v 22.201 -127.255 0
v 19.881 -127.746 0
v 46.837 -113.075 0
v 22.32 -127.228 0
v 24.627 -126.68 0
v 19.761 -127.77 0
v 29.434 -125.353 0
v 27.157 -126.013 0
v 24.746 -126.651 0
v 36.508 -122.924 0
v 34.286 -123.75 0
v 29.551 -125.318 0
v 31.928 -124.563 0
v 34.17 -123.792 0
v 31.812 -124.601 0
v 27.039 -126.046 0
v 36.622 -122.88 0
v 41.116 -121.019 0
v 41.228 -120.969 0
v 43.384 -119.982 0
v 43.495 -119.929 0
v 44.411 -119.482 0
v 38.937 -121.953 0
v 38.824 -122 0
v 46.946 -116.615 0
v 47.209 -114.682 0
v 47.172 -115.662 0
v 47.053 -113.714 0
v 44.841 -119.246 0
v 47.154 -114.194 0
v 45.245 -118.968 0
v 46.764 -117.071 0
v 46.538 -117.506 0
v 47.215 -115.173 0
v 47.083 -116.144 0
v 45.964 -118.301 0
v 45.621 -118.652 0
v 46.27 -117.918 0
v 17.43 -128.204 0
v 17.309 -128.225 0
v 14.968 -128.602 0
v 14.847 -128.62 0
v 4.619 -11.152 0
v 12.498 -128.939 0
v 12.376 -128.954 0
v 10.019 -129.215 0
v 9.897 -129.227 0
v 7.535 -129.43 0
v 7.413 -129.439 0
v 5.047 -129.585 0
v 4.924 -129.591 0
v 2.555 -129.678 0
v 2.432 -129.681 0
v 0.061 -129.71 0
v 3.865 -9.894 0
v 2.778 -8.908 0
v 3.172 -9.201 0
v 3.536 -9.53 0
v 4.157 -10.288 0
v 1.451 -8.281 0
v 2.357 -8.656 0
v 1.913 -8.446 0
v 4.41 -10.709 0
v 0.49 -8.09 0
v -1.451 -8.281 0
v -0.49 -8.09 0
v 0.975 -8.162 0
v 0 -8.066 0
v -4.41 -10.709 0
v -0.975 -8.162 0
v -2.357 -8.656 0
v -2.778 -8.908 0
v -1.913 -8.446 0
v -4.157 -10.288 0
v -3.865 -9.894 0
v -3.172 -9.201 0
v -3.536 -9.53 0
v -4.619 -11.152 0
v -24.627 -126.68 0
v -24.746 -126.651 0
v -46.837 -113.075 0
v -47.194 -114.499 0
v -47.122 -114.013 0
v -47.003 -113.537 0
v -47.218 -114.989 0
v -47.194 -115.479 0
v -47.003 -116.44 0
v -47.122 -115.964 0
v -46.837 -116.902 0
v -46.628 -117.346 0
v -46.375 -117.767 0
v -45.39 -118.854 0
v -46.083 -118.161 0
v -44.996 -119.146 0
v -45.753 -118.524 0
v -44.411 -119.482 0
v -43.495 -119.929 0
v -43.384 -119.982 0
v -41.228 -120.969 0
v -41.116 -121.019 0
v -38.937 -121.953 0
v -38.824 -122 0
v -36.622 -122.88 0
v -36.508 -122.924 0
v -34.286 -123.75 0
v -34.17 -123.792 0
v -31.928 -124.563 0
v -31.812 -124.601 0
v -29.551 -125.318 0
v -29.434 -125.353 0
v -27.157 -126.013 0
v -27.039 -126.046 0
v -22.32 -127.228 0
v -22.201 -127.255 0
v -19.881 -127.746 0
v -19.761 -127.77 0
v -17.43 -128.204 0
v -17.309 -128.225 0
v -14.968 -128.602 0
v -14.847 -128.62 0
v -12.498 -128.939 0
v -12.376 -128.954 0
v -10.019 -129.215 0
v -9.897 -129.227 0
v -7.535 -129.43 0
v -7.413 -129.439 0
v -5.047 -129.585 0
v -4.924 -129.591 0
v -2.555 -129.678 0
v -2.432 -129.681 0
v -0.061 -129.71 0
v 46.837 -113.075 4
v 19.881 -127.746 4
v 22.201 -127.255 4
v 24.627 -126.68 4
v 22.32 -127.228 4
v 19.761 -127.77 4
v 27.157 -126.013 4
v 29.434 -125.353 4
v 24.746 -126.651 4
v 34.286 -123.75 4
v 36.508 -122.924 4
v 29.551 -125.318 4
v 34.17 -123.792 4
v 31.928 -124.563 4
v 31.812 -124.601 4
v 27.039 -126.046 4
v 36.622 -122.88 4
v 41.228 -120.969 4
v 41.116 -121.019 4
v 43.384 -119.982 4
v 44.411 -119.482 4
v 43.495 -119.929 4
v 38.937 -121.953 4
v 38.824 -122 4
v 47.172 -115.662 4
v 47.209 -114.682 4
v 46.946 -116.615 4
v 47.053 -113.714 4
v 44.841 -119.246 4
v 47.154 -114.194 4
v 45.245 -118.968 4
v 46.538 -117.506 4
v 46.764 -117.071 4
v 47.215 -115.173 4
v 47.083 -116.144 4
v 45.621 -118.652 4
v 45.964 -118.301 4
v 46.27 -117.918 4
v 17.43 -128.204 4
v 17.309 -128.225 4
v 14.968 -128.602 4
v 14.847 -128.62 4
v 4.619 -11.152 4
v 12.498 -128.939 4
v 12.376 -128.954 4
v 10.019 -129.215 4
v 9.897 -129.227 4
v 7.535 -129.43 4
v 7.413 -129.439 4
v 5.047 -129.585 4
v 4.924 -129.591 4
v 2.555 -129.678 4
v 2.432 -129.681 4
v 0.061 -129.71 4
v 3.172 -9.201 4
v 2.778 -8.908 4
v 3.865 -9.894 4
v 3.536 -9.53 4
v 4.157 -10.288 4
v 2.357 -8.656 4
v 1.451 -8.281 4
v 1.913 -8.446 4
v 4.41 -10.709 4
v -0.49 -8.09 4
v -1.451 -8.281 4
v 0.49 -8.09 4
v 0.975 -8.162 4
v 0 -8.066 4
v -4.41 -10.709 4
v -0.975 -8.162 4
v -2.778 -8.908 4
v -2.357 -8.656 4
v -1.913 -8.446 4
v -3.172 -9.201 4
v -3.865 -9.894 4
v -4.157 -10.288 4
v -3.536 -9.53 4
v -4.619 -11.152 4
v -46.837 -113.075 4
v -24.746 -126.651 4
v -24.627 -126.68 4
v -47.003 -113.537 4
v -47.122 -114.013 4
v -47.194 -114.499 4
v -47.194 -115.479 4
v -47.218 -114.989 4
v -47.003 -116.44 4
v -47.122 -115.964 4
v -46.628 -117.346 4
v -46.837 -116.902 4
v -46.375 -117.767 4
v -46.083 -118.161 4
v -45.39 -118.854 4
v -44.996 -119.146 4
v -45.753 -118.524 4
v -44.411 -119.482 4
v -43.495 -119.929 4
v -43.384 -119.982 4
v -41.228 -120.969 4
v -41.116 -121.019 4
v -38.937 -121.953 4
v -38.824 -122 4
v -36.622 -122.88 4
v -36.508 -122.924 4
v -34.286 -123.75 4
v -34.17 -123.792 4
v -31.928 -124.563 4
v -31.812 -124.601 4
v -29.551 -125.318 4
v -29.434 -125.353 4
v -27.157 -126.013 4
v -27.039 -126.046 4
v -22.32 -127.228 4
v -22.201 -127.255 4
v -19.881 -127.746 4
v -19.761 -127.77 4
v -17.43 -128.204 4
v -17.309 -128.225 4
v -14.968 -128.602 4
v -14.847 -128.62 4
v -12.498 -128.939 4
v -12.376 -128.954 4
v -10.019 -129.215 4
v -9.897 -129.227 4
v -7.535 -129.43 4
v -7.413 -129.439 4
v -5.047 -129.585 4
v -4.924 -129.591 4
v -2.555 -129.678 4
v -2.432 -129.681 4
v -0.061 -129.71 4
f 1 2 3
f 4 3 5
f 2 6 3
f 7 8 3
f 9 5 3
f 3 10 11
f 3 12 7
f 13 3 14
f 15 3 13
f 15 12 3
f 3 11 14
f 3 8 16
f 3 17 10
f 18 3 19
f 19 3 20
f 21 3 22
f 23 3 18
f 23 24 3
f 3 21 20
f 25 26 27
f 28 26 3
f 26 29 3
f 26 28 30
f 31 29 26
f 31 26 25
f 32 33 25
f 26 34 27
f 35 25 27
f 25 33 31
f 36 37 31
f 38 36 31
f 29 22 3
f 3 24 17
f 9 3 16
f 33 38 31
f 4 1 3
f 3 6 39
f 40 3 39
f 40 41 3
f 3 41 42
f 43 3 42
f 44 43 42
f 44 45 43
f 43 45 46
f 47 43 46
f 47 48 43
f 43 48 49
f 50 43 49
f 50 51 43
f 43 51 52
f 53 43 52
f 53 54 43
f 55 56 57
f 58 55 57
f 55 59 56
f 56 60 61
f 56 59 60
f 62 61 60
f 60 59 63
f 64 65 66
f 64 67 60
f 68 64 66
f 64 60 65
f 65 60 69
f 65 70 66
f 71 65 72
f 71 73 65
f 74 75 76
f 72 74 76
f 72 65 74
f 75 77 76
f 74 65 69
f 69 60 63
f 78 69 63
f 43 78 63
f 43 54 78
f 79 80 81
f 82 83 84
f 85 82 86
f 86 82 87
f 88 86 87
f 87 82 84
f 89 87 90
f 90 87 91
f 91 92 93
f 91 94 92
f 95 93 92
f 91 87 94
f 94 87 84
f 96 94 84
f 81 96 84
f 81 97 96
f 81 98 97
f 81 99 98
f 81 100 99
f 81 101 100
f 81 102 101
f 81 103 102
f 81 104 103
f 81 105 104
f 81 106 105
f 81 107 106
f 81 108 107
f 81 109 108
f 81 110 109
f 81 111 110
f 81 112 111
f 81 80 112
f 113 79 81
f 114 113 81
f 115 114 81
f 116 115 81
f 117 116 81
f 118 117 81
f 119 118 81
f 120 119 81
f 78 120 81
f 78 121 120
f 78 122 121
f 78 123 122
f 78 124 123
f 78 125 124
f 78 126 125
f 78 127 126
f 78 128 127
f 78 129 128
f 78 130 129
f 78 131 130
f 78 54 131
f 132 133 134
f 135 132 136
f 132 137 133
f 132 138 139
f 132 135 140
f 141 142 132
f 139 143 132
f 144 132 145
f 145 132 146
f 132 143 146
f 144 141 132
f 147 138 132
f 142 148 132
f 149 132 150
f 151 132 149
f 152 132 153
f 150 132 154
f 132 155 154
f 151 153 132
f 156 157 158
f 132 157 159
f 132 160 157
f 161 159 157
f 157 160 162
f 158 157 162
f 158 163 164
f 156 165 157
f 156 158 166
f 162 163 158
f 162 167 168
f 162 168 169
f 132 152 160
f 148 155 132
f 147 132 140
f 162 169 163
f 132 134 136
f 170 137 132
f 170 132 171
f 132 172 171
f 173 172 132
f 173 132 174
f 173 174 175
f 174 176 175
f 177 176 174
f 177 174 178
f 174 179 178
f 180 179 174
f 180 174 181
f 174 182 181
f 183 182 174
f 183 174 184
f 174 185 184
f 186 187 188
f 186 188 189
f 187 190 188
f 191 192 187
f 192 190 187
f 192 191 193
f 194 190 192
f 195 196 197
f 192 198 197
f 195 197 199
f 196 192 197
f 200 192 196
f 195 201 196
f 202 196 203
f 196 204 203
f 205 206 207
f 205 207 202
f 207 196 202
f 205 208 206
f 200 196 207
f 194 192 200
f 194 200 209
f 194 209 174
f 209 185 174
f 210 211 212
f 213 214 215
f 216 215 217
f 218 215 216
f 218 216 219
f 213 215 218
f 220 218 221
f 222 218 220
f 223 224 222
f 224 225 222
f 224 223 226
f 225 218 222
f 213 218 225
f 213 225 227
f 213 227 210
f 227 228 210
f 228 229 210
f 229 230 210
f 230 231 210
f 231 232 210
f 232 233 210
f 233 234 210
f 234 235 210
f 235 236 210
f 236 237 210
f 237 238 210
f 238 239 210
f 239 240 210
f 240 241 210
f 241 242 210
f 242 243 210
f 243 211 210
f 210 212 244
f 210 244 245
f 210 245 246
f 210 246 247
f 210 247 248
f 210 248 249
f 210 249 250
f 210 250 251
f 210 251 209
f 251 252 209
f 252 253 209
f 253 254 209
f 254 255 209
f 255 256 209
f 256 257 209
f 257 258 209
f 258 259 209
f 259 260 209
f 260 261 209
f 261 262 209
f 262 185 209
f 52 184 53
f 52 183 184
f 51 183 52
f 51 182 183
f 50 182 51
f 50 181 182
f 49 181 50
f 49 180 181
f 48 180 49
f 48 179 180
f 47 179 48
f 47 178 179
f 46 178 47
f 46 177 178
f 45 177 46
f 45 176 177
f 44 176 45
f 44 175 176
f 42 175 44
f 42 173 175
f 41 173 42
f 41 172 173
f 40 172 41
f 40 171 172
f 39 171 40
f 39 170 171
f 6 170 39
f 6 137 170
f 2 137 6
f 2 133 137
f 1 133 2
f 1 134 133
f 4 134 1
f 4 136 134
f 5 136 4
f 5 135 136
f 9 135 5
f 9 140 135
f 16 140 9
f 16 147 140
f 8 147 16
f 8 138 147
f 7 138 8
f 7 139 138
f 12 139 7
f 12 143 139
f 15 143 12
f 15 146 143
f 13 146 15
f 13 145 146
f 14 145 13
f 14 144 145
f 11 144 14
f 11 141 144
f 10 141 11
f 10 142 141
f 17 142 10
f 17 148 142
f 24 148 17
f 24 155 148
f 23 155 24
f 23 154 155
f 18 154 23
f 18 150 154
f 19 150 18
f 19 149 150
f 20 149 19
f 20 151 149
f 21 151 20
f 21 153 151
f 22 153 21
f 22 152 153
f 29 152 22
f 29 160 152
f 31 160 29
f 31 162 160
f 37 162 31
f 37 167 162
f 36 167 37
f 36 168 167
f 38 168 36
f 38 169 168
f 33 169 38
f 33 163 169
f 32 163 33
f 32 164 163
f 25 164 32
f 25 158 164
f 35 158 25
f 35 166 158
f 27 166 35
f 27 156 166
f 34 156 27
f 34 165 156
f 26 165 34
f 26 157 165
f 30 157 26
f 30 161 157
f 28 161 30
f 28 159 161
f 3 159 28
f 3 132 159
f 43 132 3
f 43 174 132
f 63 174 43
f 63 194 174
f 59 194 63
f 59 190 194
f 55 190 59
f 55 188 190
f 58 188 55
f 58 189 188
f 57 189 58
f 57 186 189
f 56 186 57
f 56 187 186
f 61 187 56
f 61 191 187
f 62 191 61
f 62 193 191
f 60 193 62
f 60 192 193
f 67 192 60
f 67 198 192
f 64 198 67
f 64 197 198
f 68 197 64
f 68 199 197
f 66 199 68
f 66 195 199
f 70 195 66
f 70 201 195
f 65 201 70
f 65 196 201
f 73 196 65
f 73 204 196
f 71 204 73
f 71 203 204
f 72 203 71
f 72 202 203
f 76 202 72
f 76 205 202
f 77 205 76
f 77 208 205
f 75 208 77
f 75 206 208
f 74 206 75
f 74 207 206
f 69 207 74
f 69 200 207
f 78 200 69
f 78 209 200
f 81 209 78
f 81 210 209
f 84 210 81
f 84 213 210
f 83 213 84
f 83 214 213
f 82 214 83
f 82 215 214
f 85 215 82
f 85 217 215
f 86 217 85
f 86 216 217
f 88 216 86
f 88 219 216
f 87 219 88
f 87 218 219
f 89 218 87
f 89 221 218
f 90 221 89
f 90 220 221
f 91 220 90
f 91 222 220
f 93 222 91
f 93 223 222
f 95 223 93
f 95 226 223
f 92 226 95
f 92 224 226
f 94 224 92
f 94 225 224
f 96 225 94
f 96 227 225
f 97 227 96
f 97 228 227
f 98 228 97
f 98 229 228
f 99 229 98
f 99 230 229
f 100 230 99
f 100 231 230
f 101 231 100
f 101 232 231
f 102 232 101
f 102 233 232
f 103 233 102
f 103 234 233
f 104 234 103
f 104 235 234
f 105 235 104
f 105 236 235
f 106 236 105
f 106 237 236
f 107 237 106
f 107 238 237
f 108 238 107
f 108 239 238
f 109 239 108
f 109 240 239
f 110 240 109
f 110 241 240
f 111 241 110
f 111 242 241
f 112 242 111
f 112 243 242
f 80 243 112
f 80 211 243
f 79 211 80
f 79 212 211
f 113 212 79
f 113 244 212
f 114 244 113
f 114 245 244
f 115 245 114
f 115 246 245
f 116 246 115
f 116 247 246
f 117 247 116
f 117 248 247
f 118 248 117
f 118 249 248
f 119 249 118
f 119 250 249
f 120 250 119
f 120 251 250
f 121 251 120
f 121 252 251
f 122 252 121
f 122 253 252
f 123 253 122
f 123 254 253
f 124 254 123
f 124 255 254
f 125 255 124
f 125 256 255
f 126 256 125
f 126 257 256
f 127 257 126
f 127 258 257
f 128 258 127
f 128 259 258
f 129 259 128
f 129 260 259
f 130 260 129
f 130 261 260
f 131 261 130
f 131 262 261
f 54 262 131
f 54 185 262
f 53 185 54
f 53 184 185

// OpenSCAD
// R4 Radius Gauge Template
// Isoceles triangle with 45° apex angle.
// Two straight sides; base is a convex arc with R = 4" = 101.6mm curving outward.
// Thickness: 4mm
//
// Usage: press the convex base arc into the inside of a bend
// to verify a 4-inch (101.6mm) radius. Arc should seat flush with no gap.

// ========== Parameters ==========

R_arc      = 101.6;  // Arc radius: 4 inches in mm
leg        = 127.0;  // Length of each straight side: 5 inches
apex_angle =  45.0;  // Apex angle in degrees
r_corner   =   5.0;  // Corner roundover radius
thickness  =   4.0;  // Part thickness: 4mm

// ========== Derived Dimensions ==========

half_angle = apex_angle / 2;

// Chord length across the base (distance between the two base corners)
chord = 2 * leg * sin(half_angle);

// Height from apex down to the base chord
tri_height = leg * cos(half_angle);

// Vertex positions: apex at top, base corners at bottom, centered on X axis
V_apex  = [         0,           0 ];
V_left  = [ -chord / 2, -tri_height ];
V_right = [  chord / 2, -tri_height ];

// Distance from base chord to arc center (arc center sits inside the triangle,
// above the base chord, so the arc curves outward/downward).
d_arc = sqrt(R_arc * R_arc - (chord / 2) * (chord / 2));

// Arc center inside the triangle, d_arc above the base chord
arc_center = [ 0, -tri_height + d_arc ];

// ========== 2D Profile ==========

module gauge_2d() {
    // Round all convex corners (including the arc-to-straight junctions at the
    // base corners) using erosion-then-dilation.
    offset(r = r_corner, $fn = 64)
    offset(r = -r_corner)
    union() {
        // Solid triangle
        polygon([ V_apex, V_left, V_right ]);
        // Add the circular segment below the base chord to form the outward arc
        intersection() {
            translate(arc_center) circle(R_arc, $fn = 256);
            // Half-plane below the base chord: top edge at y = -tri_height,
            // extending downward by R_arc (more than enough for the arc sag)
            translate([ -R_arc, -tri_height - R_arc ])
                square([ 2 * R_arc, R_arc ]);
        }
    }
}

// ========== Render ==========

linear_extrude(height = thickness)
    gauge_2d();
